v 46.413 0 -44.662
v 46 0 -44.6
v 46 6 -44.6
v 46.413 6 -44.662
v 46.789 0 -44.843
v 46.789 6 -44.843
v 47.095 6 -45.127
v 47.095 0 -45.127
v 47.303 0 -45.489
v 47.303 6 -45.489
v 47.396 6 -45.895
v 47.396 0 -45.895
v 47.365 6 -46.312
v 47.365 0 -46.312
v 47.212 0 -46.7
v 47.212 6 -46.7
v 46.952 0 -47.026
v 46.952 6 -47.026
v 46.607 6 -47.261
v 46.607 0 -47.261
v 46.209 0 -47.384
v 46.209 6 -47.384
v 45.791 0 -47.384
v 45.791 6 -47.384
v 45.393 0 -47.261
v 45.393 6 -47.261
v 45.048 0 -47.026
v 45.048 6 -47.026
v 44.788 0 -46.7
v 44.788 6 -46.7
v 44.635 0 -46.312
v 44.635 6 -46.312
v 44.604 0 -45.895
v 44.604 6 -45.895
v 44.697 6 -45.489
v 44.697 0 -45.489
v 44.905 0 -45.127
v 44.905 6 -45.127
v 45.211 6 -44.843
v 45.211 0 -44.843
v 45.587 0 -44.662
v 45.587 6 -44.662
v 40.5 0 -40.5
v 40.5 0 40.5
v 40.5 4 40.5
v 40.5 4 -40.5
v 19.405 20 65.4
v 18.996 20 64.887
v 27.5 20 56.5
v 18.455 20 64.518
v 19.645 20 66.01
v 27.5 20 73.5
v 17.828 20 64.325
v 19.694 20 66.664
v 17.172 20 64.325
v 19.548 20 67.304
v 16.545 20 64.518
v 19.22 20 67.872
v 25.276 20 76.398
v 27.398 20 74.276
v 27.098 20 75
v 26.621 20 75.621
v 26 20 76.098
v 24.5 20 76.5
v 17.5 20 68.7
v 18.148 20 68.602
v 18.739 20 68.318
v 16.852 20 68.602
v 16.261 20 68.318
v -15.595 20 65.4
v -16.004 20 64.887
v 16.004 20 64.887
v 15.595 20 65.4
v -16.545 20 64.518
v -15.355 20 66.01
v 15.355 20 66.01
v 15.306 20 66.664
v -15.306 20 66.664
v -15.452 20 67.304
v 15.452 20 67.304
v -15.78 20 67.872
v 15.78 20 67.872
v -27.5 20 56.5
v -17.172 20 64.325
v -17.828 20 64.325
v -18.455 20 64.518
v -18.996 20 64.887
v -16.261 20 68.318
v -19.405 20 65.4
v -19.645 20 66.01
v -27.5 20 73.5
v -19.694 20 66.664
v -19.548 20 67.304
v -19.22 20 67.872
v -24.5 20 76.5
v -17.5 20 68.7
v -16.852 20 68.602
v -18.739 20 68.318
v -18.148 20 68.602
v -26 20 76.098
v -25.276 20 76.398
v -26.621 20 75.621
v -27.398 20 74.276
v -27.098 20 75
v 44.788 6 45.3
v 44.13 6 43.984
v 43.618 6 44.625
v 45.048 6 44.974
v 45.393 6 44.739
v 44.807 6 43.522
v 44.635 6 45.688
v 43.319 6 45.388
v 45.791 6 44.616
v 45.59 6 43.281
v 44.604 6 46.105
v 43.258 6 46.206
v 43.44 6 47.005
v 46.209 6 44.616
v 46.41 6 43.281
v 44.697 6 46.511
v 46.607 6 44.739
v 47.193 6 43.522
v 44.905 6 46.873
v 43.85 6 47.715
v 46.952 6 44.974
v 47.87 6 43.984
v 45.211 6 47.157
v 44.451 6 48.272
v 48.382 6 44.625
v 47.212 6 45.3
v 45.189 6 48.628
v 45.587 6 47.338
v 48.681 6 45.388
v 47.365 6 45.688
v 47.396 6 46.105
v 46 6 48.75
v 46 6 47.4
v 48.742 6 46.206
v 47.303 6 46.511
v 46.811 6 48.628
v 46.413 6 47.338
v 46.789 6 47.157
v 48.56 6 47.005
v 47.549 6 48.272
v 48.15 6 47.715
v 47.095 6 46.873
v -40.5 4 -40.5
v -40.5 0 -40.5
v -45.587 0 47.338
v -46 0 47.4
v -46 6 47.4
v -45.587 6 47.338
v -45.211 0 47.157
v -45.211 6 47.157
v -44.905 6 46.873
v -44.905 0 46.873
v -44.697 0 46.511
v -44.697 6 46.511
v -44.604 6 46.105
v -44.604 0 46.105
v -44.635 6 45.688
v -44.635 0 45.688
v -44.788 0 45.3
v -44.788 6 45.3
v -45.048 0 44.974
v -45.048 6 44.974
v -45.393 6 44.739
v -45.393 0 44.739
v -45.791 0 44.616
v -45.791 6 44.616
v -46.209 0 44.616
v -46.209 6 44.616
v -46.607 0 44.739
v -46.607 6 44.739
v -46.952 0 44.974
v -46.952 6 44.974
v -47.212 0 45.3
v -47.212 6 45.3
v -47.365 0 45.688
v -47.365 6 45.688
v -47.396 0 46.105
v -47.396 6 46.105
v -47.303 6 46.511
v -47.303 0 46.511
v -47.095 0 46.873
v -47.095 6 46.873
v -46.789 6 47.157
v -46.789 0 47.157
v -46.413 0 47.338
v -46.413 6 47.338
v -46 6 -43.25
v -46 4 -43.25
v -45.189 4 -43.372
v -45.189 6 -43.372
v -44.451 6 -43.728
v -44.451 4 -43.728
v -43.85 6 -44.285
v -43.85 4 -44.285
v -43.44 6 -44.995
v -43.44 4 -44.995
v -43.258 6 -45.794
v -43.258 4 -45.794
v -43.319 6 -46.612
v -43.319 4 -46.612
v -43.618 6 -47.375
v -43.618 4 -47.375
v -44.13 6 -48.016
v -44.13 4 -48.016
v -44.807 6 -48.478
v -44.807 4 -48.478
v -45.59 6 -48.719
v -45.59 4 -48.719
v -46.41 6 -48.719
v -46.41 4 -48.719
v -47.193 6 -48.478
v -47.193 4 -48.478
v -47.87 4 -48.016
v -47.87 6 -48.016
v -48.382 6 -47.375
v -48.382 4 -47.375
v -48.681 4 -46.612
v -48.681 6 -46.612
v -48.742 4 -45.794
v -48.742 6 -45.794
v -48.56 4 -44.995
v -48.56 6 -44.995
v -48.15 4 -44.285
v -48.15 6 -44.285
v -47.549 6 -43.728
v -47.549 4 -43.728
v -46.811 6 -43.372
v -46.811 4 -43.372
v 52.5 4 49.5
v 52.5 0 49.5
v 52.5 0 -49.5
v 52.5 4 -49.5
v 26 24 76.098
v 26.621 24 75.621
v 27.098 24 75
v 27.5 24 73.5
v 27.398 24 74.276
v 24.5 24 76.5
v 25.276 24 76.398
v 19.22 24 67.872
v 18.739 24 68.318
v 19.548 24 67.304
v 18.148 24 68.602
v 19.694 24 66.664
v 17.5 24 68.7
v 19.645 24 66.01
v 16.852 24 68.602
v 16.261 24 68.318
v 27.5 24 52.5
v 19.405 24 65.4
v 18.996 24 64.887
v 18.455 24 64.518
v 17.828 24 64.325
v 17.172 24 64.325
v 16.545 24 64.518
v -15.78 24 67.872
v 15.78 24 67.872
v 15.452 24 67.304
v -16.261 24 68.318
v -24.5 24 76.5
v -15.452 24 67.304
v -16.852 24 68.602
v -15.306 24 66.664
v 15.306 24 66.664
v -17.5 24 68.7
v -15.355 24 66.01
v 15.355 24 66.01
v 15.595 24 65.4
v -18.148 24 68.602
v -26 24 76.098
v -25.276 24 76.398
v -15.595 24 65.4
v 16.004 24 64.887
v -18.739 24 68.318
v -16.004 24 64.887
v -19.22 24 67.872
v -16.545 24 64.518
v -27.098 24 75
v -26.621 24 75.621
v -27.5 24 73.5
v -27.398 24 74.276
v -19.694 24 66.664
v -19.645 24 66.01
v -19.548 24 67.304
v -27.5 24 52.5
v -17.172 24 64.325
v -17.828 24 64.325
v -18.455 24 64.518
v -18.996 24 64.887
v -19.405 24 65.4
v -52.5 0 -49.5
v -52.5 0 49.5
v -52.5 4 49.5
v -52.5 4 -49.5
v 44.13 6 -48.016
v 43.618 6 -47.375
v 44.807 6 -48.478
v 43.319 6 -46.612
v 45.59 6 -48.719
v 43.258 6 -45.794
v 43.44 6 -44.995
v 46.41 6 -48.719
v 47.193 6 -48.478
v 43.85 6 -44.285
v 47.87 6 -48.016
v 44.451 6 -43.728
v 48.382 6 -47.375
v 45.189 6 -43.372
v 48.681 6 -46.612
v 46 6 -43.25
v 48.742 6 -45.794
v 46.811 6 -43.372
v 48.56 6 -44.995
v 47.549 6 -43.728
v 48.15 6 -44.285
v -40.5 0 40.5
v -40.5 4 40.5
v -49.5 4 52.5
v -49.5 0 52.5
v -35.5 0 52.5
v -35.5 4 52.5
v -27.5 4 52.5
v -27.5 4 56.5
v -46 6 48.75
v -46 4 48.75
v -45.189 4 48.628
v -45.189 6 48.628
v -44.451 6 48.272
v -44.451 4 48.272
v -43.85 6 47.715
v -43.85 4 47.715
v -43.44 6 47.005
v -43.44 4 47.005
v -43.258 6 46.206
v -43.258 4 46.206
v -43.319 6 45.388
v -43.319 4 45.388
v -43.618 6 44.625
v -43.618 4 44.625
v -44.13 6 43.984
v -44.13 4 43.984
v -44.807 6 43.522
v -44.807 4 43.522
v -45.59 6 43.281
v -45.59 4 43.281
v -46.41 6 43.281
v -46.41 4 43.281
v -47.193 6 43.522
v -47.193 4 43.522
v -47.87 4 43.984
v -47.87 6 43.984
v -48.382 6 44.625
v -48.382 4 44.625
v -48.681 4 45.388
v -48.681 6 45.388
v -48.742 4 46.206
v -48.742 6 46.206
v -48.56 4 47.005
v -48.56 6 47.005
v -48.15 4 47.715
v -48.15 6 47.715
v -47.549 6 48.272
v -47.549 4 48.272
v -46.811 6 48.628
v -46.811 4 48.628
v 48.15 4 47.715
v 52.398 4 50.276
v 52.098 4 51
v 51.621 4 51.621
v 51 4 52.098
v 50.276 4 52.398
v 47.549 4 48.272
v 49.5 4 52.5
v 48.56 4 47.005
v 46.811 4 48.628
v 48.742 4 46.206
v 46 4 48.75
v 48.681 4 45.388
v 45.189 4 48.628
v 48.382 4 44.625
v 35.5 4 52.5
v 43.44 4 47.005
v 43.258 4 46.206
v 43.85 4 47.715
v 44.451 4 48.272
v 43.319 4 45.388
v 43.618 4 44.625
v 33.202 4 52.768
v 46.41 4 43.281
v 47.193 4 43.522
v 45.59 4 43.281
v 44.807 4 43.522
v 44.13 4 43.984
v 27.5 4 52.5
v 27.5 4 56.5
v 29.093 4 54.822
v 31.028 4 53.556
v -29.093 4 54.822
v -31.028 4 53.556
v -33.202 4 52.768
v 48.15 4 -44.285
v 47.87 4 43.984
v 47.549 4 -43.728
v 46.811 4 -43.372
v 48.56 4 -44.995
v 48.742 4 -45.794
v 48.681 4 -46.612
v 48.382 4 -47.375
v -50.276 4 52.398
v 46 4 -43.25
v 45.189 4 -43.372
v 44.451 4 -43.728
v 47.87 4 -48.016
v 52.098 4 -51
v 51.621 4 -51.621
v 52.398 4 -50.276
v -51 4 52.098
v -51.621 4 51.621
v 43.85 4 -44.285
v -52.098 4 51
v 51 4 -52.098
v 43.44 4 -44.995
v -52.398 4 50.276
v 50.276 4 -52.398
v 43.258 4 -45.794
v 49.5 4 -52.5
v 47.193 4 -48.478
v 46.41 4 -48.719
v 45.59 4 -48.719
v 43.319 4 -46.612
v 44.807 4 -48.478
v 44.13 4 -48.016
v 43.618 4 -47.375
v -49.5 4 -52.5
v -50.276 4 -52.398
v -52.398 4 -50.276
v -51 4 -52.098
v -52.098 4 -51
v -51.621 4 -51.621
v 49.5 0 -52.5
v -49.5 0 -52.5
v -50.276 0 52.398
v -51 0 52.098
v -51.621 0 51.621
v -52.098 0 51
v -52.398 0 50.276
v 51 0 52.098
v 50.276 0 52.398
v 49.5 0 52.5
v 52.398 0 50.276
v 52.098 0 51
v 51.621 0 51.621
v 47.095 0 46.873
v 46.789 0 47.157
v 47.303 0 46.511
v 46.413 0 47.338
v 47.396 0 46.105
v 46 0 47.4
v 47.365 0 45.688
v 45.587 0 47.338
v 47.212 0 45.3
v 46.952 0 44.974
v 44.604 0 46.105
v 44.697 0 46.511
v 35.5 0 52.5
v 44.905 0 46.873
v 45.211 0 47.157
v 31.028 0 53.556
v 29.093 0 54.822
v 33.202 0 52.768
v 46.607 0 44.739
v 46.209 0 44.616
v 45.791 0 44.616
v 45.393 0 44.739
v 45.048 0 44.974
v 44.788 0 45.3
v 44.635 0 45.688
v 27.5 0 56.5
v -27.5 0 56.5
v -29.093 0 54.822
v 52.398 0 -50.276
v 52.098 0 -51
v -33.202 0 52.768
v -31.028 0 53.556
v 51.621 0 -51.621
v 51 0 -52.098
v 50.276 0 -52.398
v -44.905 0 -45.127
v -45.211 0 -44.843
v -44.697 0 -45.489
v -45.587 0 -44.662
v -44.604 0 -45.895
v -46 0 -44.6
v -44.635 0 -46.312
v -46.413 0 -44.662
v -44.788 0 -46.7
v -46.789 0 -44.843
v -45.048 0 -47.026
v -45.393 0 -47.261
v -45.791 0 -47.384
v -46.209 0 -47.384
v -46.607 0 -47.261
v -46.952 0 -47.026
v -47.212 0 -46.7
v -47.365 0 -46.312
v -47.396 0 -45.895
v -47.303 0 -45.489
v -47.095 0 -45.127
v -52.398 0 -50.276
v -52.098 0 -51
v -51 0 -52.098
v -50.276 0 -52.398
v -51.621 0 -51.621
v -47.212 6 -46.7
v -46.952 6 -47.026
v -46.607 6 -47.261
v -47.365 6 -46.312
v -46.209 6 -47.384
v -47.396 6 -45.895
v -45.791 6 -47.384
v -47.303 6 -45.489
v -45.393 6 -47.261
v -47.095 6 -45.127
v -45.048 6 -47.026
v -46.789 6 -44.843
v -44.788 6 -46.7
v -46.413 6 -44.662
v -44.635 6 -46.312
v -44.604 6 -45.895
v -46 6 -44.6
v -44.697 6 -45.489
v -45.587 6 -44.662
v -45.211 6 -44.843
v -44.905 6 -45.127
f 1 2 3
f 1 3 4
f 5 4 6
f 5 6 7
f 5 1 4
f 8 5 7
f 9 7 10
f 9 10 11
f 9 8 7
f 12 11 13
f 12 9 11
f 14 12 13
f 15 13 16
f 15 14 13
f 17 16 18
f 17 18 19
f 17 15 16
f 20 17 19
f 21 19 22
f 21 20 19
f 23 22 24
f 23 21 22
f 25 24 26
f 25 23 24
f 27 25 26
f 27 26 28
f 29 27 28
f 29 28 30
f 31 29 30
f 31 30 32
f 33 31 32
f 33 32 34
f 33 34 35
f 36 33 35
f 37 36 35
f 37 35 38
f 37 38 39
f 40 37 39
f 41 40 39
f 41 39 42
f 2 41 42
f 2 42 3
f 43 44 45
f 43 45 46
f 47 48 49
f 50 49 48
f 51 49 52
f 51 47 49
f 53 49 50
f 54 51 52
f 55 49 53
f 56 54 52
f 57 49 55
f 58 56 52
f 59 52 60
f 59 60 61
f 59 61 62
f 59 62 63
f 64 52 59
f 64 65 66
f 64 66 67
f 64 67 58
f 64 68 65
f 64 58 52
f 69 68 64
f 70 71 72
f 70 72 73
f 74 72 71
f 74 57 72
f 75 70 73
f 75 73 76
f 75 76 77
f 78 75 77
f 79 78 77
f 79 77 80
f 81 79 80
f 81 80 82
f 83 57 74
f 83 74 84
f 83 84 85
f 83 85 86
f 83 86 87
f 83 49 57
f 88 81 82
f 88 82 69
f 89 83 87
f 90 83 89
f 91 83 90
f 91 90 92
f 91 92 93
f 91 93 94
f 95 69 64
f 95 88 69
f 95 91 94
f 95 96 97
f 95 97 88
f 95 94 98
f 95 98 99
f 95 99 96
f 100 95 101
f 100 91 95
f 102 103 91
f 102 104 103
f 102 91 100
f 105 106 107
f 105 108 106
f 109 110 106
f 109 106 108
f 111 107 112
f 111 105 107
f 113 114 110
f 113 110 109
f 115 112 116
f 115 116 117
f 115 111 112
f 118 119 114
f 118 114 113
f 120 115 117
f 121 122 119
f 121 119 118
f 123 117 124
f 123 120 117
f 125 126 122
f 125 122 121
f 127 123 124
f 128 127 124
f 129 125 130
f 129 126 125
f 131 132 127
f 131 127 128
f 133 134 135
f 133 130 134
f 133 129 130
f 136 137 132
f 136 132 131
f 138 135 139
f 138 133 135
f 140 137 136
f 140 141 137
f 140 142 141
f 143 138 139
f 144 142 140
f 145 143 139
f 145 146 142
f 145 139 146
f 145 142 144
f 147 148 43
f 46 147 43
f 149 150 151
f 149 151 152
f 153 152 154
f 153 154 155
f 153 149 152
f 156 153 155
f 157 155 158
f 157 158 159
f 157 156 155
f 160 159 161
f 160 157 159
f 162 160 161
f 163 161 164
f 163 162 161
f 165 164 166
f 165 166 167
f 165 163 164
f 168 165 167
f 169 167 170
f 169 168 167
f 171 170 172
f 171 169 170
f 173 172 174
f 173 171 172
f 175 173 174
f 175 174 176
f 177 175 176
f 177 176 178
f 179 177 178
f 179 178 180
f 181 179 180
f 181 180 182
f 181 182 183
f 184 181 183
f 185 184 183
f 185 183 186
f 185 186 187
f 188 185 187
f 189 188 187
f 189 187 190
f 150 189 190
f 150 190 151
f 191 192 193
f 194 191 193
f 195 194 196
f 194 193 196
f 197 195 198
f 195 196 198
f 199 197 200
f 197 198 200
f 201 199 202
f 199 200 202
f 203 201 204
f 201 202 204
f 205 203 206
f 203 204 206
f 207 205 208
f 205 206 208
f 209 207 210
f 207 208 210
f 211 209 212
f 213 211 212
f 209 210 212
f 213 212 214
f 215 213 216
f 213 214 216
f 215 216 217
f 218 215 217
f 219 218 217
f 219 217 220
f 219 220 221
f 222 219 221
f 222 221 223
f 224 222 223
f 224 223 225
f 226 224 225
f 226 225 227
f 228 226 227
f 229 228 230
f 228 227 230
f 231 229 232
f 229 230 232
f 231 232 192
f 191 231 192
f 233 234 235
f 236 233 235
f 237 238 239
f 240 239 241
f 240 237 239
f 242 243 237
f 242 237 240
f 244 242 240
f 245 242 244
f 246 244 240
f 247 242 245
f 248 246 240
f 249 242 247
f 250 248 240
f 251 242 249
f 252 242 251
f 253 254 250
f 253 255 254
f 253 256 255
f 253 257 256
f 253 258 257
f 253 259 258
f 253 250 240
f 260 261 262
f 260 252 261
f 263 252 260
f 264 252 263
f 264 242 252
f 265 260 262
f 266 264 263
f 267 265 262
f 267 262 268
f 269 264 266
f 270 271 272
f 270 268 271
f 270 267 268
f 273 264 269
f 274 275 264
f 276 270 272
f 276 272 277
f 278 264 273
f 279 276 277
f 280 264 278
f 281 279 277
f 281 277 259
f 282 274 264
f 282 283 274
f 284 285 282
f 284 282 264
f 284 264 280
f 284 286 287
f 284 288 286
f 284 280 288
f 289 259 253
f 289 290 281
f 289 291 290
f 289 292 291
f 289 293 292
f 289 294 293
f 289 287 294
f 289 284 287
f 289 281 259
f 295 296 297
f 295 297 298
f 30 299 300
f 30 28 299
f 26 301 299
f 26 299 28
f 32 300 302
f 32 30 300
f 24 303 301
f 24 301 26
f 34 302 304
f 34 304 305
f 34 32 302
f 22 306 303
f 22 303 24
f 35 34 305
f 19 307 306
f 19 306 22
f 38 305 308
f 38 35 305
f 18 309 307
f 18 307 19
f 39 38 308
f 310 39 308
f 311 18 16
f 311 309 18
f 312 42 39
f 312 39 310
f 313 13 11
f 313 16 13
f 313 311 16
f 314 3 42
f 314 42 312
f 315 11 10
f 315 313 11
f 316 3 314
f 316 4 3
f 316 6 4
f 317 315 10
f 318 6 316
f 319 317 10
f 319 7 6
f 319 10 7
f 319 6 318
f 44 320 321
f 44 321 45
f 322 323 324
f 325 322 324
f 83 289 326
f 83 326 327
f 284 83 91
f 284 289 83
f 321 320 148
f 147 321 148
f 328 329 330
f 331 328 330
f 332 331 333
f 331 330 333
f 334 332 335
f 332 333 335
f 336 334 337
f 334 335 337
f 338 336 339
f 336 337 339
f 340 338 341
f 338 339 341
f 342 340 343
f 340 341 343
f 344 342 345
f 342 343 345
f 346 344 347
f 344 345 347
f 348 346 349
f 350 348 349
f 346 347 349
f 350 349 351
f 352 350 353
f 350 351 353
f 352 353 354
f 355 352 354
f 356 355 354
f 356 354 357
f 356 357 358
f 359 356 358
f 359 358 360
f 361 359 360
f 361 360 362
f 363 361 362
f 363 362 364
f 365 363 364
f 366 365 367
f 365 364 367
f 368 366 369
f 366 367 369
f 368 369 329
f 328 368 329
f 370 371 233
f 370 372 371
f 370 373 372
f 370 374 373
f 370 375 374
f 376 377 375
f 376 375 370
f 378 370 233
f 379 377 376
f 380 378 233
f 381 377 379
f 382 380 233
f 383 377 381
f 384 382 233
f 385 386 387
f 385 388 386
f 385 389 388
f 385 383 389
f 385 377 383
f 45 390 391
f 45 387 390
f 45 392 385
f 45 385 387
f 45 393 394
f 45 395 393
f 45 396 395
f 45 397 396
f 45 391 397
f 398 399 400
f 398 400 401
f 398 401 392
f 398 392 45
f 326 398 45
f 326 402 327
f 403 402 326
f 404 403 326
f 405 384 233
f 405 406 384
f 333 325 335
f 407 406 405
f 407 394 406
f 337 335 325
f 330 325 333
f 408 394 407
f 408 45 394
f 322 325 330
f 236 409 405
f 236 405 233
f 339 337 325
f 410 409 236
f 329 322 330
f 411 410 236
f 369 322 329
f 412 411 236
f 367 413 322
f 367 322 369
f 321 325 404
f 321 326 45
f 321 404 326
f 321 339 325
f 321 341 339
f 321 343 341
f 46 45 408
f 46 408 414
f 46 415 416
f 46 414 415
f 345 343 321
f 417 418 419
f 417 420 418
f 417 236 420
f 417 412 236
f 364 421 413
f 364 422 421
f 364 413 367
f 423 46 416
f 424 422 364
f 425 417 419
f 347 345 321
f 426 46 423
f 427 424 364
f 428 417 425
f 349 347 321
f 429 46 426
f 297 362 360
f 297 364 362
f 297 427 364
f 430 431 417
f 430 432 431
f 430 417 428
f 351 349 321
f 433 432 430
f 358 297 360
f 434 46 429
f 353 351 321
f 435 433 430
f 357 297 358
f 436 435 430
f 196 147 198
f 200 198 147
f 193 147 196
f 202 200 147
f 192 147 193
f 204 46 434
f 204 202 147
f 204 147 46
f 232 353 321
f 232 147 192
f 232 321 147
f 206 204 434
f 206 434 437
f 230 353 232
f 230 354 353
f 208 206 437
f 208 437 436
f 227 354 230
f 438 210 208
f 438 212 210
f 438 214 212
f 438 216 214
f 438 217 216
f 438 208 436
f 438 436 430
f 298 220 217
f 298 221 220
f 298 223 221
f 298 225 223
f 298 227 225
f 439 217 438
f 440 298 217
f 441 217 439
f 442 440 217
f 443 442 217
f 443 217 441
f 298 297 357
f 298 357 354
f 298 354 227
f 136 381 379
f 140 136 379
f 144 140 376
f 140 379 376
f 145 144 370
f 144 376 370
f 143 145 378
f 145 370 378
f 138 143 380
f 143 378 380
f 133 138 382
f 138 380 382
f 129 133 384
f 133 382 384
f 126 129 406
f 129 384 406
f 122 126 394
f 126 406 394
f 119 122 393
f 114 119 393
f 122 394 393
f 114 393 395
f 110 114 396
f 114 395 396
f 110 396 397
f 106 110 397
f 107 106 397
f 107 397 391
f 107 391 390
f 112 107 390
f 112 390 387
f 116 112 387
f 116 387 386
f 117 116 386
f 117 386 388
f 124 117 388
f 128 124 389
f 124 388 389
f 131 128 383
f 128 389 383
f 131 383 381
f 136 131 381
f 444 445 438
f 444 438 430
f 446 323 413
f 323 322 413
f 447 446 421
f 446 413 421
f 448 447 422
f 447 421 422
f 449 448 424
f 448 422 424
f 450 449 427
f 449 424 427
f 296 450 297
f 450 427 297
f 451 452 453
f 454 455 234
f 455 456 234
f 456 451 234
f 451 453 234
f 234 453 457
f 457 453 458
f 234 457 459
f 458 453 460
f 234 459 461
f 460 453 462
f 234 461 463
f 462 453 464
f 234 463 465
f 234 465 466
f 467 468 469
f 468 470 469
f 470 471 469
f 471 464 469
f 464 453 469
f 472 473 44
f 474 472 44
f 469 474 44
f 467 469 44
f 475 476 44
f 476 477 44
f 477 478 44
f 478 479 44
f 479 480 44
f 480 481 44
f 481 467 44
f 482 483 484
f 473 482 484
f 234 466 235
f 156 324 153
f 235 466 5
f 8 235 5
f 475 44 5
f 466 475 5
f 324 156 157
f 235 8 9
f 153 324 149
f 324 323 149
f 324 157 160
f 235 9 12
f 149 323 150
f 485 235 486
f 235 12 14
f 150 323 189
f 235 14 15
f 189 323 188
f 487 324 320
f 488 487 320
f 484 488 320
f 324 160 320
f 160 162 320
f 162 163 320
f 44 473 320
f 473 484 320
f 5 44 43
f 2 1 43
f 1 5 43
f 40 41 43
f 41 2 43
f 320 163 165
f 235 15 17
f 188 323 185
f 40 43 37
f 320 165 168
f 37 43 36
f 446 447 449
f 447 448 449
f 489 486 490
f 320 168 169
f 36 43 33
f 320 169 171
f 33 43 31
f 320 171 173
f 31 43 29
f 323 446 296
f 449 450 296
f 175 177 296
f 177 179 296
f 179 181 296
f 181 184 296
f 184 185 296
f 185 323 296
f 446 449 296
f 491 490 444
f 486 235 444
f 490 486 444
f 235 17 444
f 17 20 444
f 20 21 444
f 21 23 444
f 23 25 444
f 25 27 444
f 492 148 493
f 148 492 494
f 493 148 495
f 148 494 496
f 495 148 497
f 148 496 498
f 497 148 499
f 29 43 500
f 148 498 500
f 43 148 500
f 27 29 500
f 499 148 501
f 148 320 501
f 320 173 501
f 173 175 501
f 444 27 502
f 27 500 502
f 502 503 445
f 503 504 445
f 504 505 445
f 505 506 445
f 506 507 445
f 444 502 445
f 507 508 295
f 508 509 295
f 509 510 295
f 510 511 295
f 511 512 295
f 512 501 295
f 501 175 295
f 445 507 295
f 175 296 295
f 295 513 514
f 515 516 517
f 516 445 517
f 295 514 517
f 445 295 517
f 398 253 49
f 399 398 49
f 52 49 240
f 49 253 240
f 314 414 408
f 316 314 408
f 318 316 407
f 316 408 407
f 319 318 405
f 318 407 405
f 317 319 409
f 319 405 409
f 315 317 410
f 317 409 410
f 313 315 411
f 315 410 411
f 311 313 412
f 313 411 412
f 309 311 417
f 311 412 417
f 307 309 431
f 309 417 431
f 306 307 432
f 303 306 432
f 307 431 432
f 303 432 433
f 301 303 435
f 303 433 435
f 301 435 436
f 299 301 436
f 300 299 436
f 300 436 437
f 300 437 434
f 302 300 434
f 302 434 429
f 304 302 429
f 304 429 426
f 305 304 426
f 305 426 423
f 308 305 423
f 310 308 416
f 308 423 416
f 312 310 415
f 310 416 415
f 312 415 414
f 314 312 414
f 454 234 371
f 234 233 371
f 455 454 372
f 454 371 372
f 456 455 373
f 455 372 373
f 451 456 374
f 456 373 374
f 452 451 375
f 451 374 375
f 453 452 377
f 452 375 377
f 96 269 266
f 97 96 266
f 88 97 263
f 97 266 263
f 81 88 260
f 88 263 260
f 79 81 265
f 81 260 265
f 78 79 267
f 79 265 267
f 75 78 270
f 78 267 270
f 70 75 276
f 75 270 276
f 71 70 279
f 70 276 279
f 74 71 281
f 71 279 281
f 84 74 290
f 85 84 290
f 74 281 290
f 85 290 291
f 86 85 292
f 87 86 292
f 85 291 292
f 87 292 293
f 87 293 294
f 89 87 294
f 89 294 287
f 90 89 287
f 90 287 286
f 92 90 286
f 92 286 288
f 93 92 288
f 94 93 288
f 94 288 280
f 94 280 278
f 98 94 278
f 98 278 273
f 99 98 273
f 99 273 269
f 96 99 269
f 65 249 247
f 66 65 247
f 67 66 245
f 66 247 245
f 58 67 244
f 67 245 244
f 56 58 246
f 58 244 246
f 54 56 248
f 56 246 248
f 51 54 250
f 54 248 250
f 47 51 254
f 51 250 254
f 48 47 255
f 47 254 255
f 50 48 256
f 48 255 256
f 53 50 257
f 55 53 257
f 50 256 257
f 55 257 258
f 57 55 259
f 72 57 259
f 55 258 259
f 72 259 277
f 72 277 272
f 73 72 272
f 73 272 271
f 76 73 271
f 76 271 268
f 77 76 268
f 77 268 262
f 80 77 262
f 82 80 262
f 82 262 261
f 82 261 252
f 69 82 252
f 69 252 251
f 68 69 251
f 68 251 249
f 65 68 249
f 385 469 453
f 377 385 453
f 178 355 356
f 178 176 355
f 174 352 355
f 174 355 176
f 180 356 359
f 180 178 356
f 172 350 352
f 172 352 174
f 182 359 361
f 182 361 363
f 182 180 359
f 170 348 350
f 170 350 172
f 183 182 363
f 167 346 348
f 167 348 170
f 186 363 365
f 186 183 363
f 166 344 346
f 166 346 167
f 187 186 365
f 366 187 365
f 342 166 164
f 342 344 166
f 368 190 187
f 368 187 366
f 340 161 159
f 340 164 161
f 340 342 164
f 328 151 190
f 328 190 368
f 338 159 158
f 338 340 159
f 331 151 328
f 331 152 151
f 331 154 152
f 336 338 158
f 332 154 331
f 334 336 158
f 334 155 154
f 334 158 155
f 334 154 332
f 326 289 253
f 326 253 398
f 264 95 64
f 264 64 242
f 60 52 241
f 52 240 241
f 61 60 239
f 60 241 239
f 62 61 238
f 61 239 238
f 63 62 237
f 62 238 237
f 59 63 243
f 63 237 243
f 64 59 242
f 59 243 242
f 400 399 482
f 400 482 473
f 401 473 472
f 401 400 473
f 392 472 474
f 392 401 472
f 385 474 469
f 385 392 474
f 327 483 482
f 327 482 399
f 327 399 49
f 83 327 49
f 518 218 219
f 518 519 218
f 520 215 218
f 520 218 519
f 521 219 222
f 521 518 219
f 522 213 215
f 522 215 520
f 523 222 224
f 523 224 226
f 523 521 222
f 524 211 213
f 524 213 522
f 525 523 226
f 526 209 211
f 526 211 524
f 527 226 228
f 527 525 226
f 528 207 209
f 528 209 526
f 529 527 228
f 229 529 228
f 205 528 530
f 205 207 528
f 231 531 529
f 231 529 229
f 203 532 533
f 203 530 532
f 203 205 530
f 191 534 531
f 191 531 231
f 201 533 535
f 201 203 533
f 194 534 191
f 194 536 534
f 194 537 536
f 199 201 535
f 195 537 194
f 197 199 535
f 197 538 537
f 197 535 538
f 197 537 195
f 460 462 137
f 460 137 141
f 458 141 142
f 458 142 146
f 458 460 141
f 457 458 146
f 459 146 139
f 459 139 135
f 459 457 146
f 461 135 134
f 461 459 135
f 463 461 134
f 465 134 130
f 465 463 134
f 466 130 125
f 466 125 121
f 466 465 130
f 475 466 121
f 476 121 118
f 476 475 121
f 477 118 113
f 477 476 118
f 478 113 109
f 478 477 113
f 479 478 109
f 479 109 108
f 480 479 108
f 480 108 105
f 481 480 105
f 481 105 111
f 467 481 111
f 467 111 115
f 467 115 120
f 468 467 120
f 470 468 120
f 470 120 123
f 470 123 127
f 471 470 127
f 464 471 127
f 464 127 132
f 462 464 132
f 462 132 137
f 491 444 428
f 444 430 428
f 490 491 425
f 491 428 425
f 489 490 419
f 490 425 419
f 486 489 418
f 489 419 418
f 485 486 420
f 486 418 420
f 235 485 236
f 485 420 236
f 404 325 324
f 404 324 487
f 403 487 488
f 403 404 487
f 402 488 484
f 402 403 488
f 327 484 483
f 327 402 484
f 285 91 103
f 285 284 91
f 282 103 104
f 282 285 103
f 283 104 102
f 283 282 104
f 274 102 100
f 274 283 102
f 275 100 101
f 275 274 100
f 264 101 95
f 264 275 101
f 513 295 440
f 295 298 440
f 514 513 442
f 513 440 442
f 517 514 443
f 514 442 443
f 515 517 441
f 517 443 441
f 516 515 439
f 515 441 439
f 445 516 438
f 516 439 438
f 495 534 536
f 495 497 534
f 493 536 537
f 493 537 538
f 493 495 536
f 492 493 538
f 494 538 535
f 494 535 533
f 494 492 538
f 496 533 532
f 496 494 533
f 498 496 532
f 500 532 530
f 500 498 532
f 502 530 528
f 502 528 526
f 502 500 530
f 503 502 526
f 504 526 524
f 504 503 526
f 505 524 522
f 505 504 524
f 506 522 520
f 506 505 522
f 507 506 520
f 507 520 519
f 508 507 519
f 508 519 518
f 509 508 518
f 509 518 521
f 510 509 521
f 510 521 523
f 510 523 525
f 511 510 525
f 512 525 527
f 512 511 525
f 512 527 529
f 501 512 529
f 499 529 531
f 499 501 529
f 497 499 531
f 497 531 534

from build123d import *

# Parameters (mm, degrees)
SKETCH_1_W          = 105
SKETCH_1_H          = 105
SKETCH_1_R          = 2.75
SKETCH_1_W_2        = 81
SKETCH_1_H_2        = 81
SKETCH_1_R_2        = 1.4
EXTRUDE_1_DEPTH     = 4
EXTRUDE_START       = 4
SKETCH_1_4_R        = 2.75
SKETCH_1_4_R_2      = 1.4
EXTRUDE_2_DEPTH     = 2
EXTRUDE_START_2     = -25
EXTRUDE_3_DEPTH     = 55
CUT_EXTRUDE_1_REACH = 97.836
SKETCH_3_R          = 2.2
FILLET_1_R          = 3
FILLET_2_R          = 10


with BuildPart() as part:
    # 草图1 → 凸台-拉伸1 (new body)
    # profile 1 of 5: a face of its own
    with BuildSketch(Plane(origin=(0, 0, 0), x_dir=(1, 0, 0), z_dir=(0, 1, 0))):
        Rectangle(SKETCH_1_W, SKETCH_1_H)
        with Locations((46, 46)):
            Circle(SKETCH_1_R, mode=Mode.SUBTRACT)
        with Locations((-46, 46)):
            Circle(SKETCH_1_R, mode=Mode.SUBTRACT)
        with Locations((46, -46)):
            Circle(SKETCH_1_R, mode=Mode.SUBTRACT)
        with Locations((-46, -46)):
            Circle(SKETCH_1_R, mode=Mode.SUBTRACT)
        Rectangle(SKETCH_1_W_2, SKETCH_1_H_2, mode=Mode.SUBTRACT)
    # profile 2 of 5: a face of its own
    with BuildSketch(Plane(origin=(0, 0, 0), x_dir=(1, 0, 0), z_dir=(0, 1, 0))):
        with Locations((46, 46)):
            Circle(SKETCH_1_R)
        with Locations(Location((46, 46, 0), (0, 0, 270))):
            Circle(SKETCH_1_R_2, mode=Mode.SUBTRACT)
    # profile 3 of 5: a face of its own
    with BuildSketch(Plane(origin=(0, 0, 0), x_dir=(1, 0, 0), z_dir=(0, 1, 0))):
        with Locations((-46, 46)):
            Circle(SKETCH_1_R)
        with Locations(Location((-46, 46, 0), (0, 0, 270))):
            Circle(SKETCH_1_R_2, mode=Mode.SUBTRACT)
    # profile 4 of 5: a face of its own
    with BuildSketch(Plane(origin=(0, 0, 0), x_dir=(1, 0, 0), z_dir=(0, 1, 0))):
        with Locations((-46, -46)):
            Circle(SKETCH_1_R)
        with Locations(Location((-46, -46, 0), (0, 0, 270))):
            Circle(SKETCH_1_R_2, mode=Mode.SUBTRACT)
    # profile 5 of 5: a face of its own
    with BuildSketch(Plane(origin=(0, 0, 0), x_dir=(1, 0, 0), z_dir=(0, 1, 0))):
        with Locations((46, -46)):
            Circle(SKETCH_1_R)
        with Locations(Location((46, -46, 0), (0, 0, 270))):
            Circle(SKETCH_1_R_2, mode=Mode.SUBTRACT)
    extrude(amount=EXTRUDE_1_DEPTH)

    # 草图1<4> → 凸台-拉伸2 (add)
    # profile 1 of 4: a face of its own
    with BuildSketch(Plane(origin=(0, 0, 0), x_dir=(1, 0, 0), z_dir=(0, 1, 0)).offset(EXTRUDE_START)):
        with Locations(Location((-46, 46, 0), (0, 0, 270))):
            Circle(SKETCH_1_4_R)
        with Locations(Location((-46, 46, 0), (0, 0, 270))):
            Circle(SKETCH_1_4_R_2, mode=Mode.SUBTRACT)
    # profile 2 of 4: a face of its own
    with BuildSketch(Plane(origin=(0, 0, 0), x_dir=(1, 0, 0), z_dir=(0, 1, 0)).offset(EXTRUDE_START)):
        with Locations(Location((46, 46, 0), (0, 0, 270))):
            Circle(SKETCH_1_4_R)
        with Locations(Location((46, 46, 0), (0, 0, 270))):
            Circle(SKETCH_1_4_R_2, mode=Mode.SUBTRACT)
    # profile 3 of 4: a face of its own
    with BuildSketch(Plane(origin=(0, 0, 0), x_dir=(1, 0, 0), z_dir=(0, 1, 0)).offset(EXTRUDE_START)):
        with Locations(Location((46, -46, 0), (0, 0, 270))):
            Circle(SKETCH_1_4_R)
        with Locations(Location((46, -46, 0), (0, 0, 270))):
            Circle(SKETCH_1_4_R_2, mode=Mode.SUBTRACT)
    # profile 4 of 4: a face of its own
    with BuildSketch(Plane(origin=(0, 0, 0), x_dir=(1, 0, 0), z_dir=(0, 1, 0)).offset(EXTRUDE_START)):
        with Locations(Location((-46, -46, 0), (0, 0, 270))):
            Circle(SKETCH_1_4_R)
        with Locations(Location((-46, -46, 0), (0, 0, 270))):
            Circle(SKETCH_1_4_R_2, mode=Mode.SUBTRACT)
    extrude(amount=EXTRUDE_2_DEPTH)

    # 草图2 → 凸台-拉伸3 (add)
    with BuildSketch(Plane.ZY.offset(52.5).offset(EXTRUDE_START_2)):
        Polygon((52.5, 0), (56.5, 0), (56.5, 20), (76.5, 20), (76.5, 24), (52.5, 24), align=None)
    extrude(amount=-EXTRUDE_3_DEPTH)

    # 草图3 → 切除-拉伸1 (cut, up to next)
    with BuildSketch(Plane(origin=(0, 24, 0), x_dir=(1, 0, 0), z_dir=(0, 1, 0)), mode=Mode.PRIVATE) as cut_extrude_1_sk1:
        with Locations(Location((17.5, -66.5, 0), (0, 0, 270))):
            Circle(SKETCH_3_R)
    cut_extrude_1_tool1 = extrude(cut_extrude_1_sk1.sketch, amount=-CUT_EXTRUDE_1_REACH, mode=Mode.PRIVATE) & part.part
    # 草图3 → 切除-拉伸1 (cut, up to next)
    with BuildSketch(Plane(origin=(0, 24, 0), x_dir=(1, 0, 0), z_dir=(0, 1, 0)), mode=Mode.PRIVATE) as cut_extrude_1_sk2:
        with Locations(Location((-17.5, -66.5, 0), (0, 0, 270))):
            Circle(SKETCH_3_R)
    cut_extrude_1_tool2 = extrude(cut_extrude_1_sk2.sketch, amount=-CUT_EXTRUDE_1_REACH, mode=Mode.PRIVATE) & part.part
    add(cut_extrude_1_tool1.solids().sort_by_distance((17.5, 24, 66.5))[0], mode=Mode.SUBTRACT)
    add(cut_extrude_1_tool2.solids().sort_by_distance((-17.5, 24, 66.5))[0], mode=Mode.SUBTRACT)

    # 圆角1
    fillet_1_edges = [part.edges().sort_by_distance(p)[0] for p in [
        (-52.5, 2, -52.5),
        (52.5, 2, -52.5),
        (52.5, 2, 52.5),
        (27.5, 22, 76.5),
        (-27.5, 22, 76.5),
        (-52.5, 2, 52.5),
    ]]
    fillet(fillet_1_edges, radius=FILLET_1_R)

    # 圆角2
    # the kernel refuses this fillet: 10 mm, written as the material it adds along each edge
    with BuildSketch(Plane(origin=(27.5, 4, 52.5), x_dir=(1, 0, 0), z_dir=(0, -1, 0))) as fillet_2_piece_1:
        with BuildLine():
            CenterArc((8, 10), FILLET_2_R, 216.869897646, 53.130102354)
            Line((0, 4), (0, 0))
            Line((0, 0), (8, 0))
        make_face()
    extrude(amount=4)
    with BuildSketch(Plane(origin=(-27.5, 4, 52.5), x_dir=(0, 0, 1), z_dir=(0, -1, 0))) as fillet_2_piece_2:
        with BuildLine():
            CenterArc((10, 8), FILLET_2_R, 180, 53.130102354)
            Line((0, 8), (0, 0))
            Line((0, 0), (4, 0))
        make_face()
    extrude(amount=4)


solid = part.part
